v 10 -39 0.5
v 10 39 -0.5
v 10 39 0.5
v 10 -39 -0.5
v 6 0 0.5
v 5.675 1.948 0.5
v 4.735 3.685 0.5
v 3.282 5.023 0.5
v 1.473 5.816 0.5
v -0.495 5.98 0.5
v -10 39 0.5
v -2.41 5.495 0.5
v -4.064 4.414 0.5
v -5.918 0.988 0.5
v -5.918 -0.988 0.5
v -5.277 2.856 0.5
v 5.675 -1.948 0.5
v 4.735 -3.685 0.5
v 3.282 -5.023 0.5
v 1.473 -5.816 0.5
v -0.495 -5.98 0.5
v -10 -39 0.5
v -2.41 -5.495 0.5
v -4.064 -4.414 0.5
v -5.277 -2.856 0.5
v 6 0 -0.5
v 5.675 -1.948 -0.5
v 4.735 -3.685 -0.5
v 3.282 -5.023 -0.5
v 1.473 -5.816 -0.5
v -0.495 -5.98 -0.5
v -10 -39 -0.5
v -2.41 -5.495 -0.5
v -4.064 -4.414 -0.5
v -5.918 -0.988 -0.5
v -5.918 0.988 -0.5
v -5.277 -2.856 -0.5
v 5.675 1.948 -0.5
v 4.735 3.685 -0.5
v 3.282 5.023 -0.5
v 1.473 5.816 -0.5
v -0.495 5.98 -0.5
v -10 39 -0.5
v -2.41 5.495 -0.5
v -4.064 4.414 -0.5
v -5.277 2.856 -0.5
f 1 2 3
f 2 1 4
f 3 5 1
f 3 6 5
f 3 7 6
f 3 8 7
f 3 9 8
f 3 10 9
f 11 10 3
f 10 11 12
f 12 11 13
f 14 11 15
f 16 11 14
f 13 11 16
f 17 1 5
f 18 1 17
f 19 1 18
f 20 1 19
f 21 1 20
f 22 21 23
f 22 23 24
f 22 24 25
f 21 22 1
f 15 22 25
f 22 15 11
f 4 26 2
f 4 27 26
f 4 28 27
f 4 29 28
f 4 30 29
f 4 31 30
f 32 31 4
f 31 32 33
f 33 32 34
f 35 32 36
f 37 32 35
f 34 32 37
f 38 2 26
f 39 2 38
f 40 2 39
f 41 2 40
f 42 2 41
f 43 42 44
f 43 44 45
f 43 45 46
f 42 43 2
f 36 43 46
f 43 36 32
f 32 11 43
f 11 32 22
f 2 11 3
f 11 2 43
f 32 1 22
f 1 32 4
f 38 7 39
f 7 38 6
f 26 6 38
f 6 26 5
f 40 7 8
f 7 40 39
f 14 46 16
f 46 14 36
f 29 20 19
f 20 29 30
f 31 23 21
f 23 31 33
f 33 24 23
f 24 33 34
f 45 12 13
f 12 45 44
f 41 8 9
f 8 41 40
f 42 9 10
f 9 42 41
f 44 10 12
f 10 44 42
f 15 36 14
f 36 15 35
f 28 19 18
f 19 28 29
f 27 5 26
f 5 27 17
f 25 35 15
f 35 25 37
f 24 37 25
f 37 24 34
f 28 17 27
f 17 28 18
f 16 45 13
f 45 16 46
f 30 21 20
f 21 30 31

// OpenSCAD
SpaSidePanelTemplate(20, 78, 6);

module SpaSidePanelTemplate(width, length, radius) {
    difference() {
        cube([width, length, 1], center=true);
        translate([0, 0, -5]) cylinder(r=radius, h=10);
    }
    
}
